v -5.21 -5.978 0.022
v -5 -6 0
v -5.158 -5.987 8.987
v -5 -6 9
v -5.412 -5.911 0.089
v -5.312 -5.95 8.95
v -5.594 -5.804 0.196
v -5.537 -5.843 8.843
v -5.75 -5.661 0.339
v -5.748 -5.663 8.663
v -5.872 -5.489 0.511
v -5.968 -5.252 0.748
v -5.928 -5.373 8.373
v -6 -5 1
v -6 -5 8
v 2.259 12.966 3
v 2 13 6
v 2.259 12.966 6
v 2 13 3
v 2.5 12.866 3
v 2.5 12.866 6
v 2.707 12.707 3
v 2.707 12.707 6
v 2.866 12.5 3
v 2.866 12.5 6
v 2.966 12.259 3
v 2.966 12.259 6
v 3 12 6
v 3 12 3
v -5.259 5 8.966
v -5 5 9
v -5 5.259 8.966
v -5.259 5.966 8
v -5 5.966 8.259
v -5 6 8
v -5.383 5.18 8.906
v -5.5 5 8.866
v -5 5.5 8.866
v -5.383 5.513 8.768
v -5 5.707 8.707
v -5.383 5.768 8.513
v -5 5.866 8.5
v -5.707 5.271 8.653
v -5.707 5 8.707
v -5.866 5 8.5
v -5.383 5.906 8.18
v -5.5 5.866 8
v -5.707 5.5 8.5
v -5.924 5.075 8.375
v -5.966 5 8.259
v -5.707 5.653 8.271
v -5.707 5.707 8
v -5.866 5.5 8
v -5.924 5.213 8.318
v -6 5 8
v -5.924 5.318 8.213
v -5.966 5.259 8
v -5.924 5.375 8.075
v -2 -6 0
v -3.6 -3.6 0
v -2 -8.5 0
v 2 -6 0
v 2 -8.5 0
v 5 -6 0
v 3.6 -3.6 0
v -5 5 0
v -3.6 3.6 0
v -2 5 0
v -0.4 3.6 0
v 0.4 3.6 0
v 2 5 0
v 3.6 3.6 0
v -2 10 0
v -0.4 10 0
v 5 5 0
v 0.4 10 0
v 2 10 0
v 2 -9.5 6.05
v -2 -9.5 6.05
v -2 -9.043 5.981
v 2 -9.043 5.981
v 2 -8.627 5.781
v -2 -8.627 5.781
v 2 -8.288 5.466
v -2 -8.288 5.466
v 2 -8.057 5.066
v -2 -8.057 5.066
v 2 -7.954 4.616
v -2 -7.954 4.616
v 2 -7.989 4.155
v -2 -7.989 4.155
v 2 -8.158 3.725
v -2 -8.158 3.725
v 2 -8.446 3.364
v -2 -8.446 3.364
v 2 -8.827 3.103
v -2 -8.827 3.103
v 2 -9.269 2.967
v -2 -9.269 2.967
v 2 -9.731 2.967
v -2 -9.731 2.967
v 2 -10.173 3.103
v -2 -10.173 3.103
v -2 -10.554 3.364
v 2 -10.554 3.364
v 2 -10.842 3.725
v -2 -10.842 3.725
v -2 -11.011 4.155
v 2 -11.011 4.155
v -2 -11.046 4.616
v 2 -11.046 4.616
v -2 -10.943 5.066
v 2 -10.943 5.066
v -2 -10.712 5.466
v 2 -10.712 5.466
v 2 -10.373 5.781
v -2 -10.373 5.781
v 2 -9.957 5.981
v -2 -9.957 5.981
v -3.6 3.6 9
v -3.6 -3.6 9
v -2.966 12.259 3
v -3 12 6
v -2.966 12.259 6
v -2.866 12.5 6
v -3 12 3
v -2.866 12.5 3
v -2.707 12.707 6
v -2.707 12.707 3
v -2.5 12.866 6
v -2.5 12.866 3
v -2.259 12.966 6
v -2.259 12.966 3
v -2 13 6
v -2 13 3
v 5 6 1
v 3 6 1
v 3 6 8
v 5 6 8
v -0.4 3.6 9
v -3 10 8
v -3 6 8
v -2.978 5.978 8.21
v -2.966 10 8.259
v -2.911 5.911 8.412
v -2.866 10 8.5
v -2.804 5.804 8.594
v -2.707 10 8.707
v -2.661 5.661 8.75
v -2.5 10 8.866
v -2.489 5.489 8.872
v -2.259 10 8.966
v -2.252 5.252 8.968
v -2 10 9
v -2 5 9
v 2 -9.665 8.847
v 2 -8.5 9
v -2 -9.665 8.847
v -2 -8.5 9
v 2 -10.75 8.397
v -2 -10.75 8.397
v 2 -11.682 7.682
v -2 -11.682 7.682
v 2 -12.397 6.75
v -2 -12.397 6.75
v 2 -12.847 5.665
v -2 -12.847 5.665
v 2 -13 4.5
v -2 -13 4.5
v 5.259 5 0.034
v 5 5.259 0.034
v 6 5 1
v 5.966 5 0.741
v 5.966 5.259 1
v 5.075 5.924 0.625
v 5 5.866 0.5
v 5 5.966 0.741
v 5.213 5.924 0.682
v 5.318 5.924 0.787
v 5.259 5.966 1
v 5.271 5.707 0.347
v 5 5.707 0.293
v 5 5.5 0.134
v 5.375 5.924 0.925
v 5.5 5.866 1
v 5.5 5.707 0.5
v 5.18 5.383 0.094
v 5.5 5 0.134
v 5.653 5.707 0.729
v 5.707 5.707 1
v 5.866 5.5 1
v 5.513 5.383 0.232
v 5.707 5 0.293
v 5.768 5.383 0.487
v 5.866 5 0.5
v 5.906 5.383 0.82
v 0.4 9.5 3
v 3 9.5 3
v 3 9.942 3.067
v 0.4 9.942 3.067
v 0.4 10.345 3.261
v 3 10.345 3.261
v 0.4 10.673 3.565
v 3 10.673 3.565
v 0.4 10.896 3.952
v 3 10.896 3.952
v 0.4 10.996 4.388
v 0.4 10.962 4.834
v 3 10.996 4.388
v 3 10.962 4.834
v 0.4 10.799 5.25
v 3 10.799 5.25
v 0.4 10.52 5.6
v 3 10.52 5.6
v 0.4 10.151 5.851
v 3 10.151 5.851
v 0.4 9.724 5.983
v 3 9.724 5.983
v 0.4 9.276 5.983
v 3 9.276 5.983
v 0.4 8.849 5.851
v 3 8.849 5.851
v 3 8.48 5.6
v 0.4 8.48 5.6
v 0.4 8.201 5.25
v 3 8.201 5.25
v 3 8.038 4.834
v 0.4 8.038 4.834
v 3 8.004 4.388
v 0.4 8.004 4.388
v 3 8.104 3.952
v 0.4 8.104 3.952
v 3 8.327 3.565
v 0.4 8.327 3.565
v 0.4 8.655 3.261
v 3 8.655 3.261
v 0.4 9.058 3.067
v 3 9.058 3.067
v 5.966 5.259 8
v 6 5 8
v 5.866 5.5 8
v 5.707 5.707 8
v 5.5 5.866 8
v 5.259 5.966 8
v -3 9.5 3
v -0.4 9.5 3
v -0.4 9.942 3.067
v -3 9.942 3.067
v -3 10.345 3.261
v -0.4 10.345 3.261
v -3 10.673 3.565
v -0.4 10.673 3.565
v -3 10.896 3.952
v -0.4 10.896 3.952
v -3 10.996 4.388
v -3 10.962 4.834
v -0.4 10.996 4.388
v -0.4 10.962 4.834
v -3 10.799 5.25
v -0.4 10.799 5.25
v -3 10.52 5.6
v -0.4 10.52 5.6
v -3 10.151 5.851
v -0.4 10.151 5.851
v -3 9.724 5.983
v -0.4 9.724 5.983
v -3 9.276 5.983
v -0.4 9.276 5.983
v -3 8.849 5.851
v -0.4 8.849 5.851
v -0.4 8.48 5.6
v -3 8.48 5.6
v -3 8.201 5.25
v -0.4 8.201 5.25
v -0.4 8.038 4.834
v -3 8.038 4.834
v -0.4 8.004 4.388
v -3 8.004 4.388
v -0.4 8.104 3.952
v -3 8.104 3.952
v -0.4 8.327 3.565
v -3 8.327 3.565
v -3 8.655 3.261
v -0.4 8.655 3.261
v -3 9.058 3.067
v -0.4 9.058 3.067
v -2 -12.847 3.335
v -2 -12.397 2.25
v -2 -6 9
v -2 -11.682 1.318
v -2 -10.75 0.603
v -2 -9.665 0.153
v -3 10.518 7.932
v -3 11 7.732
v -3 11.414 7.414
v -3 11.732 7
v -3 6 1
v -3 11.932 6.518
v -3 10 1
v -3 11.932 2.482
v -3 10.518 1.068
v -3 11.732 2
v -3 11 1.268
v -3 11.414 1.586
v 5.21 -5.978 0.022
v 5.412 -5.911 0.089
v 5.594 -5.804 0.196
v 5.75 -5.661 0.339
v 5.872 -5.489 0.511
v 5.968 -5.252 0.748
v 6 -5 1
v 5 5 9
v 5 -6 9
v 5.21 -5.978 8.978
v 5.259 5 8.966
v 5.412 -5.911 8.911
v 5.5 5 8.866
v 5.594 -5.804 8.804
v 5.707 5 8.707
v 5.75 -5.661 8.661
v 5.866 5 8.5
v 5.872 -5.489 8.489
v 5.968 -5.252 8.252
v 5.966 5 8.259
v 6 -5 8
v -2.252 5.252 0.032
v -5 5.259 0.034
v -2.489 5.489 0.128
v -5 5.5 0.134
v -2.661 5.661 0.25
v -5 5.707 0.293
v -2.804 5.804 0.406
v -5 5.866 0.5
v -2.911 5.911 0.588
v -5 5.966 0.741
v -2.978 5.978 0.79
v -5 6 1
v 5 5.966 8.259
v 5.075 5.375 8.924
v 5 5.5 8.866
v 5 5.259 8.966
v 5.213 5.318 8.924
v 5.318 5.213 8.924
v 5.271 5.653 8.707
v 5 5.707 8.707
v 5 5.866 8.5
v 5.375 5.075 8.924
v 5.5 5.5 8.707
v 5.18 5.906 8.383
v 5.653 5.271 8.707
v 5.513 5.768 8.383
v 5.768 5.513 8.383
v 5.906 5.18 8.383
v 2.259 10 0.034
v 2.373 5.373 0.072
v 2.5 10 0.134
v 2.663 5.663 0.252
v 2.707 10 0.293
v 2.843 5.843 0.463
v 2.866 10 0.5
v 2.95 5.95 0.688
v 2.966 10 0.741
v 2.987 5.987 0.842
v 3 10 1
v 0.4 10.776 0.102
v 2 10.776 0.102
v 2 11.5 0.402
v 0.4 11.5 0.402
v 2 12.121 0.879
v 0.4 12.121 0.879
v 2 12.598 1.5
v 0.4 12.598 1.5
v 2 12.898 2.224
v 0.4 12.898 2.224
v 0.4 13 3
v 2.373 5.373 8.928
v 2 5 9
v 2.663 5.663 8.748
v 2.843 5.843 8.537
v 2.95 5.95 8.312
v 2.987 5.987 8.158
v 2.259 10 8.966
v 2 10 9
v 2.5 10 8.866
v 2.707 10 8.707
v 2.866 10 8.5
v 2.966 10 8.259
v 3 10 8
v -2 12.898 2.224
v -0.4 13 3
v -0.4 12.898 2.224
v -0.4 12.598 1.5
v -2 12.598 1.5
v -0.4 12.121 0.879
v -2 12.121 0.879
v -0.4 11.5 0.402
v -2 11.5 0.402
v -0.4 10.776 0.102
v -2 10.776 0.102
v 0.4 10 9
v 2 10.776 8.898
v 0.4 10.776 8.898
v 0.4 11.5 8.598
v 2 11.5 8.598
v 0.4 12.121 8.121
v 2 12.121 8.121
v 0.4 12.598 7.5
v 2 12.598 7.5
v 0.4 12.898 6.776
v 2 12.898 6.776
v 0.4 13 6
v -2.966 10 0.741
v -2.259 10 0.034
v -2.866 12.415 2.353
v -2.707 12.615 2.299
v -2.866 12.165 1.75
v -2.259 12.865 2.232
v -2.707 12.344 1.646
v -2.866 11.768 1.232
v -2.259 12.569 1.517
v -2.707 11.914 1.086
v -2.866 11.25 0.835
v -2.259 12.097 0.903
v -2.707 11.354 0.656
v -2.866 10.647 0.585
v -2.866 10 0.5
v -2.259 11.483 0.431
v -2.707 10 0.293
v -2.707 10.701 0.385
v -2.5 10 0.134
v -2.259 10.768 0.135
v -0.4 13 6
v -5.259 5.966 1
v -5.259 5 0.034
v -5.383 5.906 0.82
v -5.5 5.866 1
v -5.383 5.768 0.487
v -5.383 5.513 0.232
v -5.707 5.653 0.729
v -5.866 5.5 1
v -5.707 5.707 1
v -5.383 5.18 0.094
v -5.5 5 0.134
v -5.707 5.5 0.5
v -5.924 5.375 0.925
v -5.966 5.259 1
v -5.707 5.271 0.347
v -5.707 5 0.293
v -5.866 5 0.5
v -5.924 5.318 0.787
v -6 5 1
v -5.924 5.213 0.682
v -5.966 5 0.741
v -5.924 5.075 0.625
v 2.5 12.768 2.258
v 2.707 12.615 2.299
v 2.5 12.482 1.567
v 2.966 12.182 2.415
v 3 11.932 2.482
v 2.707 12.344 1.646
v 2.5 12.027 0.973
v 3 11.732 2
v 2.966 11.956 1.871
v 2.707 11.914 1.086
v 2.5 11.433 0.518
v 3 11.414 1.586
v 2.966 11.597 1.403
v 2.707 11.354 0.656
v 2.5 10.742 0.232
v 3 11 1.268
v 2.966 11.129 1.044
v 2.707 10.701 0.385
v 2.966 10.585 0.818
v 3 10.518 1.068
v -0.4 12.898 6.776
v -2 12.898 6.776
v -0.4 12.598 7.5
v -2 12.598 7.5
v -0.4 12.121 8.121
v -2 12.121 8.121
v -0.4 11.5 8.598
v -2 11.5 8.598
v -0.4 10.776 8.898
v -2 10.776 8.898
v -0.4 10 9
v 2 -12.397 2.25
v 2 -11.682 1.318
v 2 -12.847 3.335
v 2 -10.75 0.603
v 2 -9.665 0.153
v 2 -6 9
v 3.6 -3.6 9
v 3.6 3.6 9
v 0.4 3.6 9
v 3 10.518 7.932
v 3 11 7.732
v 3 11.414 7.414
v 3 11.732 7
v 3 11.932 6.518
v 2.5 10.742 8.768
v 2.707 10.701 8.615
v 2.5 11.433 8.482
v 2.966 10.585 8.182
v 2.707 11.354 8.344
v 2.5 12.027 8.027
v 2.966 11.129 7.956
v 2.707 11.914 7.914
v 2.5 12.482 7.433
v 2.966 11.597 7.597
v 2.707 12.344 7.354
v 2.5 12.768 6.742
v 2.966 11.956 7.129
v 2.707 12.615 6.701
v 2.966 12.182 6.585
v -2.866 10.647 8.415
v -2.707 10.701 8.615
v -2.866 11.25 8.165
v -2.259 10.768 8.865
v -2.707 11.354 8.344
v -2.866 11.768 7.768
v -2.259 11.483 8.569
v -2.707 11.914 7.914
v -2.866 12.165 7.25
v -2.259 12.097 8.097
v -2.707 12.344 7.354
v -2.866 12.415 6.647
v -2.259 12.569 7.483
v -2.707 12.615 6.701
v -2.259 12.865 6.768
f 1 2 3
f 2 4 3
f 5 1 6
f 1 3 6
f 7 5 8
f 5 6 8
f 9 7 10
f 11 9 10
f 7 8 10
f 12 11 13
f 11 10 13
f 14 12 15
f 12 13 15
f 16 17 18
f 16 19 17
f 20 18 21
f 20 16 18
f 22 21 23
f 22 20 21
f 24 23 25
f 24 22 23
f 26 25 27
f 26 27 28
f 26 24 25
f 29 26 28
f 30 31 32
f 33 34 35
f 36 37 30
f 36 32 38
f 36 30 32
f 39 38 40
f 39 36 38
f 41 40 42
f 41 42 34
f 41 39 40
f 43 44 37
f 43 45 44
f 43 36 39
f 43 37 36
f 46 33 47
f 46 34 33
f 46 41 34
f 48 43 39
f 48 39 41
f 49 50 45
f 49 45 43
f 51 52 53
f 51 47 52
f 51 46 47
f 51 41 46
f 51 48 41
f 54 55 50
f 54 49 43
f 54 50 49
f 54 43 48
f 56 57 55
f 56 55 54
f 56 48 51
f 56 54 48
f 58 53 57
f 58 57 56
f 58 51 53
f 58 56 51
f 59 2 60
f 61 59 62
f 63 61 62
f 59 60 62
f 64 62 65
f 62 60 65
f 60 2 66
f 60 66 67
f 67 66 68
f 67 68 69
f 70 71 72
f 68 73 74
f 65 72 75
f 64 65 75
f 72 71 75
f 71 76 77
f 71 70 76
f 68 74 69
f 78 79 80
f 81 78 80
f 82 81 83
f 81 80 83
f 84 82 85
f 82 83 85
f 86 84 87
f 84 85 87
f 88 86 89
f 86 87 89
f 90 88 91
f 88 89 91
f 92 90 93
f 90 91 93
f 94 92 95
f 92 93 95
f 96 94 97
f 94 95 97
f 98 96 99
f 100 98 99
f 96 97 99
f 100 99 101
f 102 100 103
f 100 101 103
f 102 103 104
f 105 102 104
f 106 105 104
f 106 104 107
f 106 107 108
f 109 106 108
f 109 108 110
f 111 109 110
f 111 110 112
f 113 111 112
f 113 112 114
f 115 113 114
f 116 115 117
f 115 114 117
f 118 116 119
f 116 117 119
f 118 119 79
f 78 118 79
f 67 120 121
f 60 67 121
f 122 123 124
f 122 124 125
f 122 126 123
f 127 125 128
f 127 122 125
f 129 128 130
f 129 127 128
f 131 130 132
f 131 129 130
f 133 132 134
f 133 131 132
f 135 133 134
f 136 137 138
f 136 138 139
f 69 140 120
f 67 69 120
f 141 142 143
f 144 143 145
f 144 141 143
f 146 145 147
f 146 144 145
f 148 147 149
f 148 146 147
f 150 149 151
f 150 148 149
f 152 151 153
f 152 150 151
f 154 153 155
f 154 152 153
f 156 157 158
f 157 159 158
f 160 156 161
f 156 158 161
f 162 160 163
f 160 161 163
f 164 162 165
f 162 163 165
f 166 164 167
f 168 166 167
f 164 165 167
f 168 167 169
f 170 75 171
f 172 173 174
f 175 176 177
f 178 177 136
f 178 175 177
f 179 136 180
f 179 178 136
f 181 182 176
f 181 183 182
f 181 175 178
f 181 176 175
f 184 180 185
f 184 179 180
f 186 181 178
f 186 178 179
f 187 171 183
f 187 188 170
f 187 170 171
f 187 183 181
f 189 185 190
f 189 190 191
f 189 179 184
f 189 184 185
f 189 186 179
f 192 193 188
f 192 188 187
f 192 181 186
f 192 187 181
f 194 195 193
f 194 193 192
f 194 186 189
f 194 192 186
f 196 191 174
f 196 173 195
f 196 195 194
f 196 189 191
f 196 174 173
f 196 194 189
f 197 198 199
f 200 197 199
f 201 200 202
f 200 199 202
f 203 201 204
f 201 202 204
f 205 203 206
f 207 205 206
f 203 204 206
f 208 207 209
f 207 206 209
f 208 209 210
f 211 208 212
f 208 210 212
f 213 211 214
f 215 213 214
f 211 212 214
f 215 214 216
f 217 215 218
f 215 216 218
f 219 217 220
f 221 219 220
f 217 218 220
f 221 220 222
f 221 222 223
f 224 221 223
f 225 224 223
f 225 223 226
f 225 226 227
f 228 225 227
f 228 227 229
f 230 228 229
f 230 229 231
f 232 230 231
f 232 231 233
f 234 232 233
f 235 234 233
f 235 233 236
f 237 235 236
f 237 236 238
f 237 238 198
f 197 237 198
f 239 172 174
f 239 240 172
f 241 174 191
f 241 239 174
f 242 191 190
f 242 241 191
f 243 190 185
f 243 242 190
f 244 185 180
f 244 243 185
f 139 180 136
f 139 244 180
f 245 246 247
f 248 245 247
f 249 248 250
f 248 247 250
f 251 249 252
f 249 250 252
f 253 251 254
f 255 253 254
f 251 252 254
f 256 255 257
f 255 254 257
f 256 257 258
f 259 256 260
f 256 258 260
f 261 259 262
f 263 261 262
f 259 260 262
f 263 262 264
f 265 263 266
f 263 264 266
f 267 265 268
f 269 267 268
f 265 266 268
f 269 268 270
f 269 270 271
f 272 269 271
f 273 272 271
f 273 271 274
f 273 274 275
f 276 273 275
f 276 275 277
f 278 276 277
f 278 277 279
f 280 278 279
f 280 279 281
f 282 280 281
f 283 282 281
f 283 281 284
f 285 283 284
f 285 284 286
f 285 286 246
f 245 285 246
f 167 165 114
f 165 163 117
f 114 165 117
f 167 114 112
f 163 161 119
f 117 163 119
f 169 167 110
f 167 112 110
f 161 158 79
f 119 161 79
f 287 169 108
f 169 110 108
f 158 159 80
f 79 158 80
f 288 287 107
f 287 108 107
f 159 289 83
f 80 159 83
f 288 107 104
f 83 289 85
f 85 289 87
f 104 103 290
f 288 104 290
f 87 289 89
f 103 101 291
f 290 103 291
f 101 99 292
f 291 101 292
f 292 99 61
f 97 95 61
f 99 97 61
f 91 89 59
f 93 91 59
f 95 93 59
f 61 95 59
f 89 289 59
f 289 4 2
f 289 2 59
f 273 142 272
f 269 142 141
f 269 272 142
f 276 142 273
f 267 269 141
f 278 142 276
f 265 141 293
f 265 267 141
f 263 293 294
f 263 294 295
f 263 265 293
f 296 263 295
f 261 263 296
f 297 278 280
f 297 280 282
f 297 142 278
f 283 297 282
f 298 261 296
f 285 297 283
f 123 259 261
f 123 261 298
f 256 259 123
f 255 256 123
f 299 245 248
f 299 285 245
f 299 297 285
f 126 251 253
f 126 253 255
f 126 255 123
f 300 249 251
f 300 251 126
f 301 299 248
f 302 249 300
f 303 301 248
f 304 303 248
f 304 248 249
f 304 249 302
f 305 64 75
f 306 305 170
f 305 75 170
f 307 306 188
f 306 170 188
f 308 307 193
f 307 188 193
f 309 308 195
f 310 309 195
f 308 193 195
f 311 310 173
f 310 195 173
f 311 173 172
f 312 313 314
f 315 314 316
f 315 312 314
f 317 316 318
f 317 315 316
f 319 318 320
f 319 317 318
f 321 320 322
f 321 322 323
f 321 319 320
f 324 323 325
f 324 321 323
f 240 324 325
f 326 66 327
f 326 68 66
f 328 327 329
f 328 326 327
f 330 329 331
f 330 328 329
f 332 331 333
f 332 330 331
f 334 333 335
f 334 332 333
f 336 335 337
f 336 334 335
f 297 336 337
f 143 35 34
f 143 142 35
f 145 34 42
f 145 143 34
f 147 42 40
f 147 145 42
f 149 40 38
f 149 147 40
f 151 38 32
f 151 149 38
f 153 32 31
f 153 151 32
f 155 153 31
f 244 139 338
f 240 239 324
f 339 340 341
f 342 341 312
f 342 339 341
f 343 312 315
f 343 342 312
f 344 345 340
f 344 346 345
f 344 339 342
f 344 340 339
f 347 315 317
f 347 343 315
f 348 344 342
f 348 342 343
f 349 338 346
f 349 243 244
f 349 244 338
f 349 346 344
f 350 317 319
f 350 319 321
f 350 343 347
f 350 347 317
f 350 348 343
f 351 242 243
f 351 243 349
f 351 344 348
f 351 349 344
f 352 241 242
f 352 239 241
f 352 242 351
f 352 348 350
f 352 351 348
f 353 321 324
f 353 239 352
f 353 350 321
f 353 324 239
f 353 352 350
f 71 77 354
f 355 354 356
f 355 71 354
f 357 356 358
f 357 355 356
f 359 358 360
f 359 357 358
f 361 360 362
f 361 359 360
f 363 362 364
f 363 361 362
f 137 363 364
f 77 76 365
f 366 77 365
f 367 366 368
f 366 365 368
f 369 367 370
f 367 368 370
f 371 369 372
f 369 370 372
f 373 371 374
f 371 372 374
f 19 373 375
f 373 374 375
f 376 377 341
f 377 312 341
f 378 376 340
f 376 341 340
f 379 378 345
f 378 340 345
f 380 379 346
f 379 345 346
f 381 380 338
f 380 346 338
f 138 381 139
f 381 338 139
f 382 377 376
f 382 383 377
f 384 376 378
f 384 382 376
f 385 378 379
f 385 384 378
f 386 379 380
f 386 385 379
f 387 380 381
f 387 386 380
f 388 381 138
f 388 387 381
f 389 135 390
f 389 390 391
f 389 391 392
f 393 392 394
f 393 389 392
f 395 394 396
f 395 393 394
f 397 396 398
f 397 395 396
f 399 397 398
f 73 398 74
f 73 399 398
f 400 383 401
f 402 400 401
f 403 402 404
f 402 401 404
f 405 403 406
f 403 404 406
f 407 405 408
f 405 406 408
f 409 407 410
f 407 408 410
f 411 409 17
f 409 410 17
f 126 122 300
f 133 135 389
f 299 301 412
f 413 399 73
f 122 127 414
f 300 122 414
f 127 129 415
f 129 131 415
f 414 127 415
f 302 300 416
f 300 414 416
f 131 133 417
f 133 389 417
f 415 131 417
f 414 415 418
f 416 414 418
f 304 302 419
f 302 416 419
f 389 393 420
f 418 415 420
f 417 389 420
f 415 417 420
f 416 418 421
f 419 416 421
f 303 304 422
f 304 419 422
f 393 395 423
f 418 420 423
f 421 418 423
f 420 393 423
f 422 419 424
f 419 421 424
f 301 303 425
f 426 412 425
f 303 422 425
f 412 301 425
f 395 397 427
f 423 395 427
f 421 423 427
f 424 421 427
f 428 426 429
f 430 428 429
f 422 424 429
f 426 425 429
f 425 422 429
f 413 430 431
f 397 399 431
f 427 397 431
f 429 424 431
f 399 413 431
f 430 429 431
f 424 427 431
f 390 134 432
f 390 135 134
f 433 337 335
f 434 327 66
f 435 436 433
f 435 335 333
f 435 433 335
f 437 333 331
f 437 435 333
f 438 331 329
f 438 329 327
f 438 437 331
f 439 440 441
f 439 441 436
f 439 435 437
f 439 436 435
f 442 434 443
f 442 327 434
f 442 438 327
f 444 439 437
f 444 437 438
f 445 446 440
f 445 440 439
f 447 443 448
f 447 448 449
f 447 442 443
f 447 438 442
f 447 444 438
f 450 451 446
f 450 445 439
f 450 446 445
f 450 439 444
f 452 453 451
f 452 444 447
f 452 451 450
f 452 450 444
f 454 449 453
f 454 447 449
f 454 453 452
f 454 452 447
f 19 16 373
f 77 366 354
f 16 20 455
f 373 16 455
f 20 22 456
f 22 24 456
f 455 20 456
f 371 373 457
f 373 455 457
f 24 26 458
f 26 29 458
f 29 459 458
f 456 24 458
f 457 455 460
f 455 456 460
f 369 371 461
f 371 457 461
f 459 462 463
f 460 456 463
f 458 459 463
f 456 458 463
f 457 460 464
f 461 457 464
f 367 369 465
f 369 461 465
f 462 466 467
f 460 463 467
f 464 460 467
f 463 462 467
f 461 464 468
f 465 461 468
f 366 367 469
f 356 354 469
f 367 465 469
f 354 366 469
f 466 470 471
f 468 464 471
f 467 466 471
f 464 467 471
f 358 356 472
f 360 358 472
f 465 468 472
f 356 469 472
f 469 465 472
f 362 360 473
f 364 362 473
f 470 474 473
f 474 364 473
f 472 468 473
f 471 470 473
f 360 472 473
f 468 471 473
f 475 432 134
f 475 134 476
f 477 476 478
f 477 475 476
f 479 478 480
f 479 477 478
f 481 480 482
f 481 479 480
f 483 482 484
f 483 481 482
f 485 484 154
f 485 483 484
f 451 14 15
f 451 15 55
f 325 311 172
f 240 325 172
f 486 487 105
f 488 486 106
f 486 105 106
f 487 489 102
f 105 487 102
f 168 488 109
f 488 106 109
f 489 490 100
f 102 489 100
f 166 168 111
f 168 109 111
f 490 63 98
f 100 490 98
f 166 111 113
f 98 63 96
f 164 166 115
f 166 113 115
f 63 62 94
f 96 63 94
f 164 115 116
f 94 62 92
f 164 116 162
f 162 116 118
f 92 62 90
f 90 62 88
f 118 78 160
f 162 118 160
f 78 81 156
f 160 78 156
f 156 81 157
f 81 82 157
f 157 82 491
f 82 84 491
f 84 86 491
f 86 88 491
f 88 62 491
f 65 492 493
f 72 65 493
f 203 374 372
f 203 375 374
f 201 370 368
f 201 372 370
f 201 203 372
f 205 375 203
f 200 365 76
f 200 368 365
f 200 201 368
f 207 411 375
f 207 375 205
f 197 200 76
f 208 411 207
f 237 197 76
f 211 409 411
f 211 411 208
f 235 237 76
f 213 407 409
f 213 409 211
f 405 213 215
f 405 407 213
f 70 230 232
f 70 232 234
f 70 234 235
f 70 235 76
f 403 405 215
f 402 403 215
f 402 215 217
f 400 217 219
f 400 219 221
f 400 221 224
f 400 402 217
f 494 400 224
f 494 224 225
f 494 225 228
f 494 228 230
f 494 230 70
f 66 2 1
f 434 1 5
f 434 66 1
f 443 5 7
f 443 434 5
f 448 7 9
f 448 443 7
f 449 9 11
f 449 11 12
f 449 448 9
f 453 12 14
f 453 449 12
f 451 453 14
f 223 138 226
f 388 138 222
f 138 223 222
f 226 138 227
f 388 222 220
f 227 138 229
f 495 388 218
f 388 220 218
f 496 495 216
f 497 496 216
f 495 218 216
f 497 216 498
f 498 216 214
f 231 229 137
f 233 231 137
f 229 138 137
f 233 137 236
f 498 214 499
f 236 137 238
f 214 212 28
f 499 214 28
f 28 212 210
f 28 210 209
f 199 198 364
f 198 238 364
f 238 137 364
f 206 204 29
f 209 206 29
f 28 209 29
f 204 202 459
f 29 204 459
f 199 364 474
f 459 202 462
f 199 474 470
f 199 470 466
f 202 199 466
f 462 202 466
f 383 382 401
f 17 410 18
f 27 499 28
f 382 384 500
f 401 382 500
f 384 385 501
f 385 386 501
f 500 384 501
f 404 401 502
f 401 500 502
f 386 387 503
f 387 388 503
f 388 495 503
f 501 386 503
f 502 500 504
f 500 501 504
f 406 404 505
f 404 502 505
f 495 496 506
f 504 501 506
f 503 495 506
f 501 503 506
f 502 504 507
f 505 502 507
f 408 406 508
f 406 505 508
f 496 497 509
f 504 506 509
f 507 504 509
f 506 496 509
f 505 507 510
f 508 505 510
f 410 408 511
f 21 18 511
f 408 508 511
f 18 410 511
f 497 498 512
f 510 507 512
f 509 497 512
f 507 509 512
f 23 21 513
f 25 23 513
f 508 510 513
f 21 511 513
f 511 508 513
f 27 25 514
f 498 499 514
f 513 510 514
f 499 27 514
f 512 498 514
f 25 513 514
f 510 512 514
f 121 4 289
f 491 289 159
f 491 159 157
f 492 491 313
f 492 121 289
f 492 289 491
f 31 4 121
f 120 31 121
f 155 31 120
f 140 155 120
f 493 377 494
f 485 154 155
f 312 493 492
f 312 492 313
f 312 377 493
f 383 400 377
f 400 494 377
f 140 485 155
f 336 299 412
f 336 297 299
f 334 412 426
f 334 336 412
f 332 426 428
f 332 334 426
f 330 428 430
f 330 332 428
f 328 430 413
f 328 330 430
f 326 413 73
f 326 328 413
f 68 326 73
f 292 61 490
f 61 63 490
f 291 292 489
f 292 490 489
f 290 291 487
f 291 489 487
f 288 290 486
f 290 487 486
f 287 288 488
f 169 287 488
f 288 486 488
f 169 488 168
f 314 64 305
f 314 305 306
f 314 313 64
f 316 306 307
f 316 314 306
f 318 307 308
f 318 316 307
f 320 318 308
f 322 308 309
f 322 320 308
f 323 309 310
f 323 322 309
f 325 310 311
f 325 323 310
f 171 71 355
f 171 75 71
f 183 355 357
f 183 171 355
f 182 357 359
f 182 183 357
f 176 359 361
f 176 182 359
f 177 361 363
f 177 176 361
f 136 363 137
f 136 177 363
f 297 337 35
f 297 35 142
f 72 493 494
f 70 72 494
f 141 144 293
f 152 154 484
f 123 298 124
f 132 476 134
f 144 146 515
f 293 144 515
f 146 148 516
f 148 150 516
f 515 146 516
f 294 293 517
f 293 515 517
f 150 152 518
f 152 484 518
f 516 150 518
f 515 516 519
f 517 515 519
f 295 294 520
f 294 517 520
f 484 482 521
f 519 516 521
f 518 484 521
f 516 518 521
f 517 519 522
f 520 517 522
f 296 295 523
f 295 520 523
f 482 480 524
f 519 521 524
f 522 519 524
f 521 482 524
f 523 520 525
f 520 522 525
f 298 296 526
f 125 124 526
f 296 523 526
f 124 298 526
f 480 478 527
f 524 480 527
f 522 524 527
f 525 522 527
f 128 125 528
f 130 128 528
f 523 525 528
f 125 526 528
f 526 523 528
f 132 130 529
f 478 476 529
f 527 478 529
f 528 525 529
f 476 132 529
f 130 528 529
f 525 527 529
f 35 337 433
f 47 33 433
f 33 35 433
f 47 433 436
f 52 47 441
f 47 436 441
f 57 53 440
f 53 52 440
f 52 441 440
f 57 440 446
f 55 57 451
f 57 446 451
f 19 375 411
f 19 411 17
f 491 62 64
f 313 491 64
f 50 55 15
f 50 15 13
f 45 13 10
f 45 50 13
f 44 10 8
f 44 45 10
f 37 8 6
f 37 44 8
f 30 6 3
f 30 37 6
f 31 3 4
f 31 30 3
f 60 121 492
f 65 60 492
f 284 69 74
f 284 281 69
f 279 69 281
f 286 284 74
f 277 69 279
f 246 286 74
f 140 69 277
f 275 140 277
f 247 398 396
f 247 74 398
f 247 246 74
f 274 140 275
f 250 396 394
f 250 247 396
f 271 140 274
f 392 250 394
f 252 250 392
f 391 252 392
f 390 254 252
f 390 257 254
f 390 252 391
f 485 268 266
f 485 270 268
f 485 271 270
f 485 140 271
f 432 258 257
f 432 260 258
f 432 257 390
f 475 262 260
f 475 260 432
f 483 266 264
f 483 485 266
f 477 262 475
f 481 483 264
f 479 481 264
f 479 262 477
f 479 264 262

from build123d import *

# Parameters (mm, degrees)
SKETCH_1_W          = 3
SKETCH_1_H          = 7
SKETCH_1_W_2        = 12
SKETCH_1_H_2        = 12
SKETCH_1_W_3        = 7
SKETCH_1_W_4        = 5
EXTRUDE_1_DEPTH     = 9
CUT_EXTRUDE_1_DEPTH = 17.911534525
FILLET_2_R          = 3
SKETCH_4_R          = 1.5
CUT_EXTRUDE_3_DEPTH = 19.193405399
FILLET_3_R          = 1
FILLET_4_R          = 1
FILLET_5_R          = 1
SKETCH_5_W          = 5
SKETCH_5_H          = 7
CUT_EXTRUDE_4_DEPTH = 9
EXTRUDE_2_DEPTH     = 7
FILLET_6_R          = 4.5
SKETCH_7_R          = 1.55
CUT_EXTRUDE_5_DEPTH = 4
SKETCH_8_W          = 3.1
SKETCH_8_H          = 0.1
CUT_EXTRUDE_6_DEPTH = 17.911534525


# Some blends are built 0.0001 mm under size
with BuildPart() as part:
    # 草图1 → 凸台-拉伸1 (new body)
    # profile 1 of 4: a face of its own
    with BuildSketch(Plane.XY):
        with Locations((-1.5, 9.5)):
            Rectangle(SKETCH_1_W, SKETCH_1_H)
    # profile 2 of 4: a face of its own
    with BuildSketch(Plane.XY):
        with Locations((1.5, 9.5)):
            Rectangle(SKETCH_1_W, SKETCH_1_H)
    # profile 3 of 4: a face of its own
    with BuildSketch(Plane.XY):
        Rectangle(SKETCH_1_W_2, SKETCH_1_H_2)
        Rectangle(SKETCH_1_W_3, SKETCH_1_H, mode=Mode.SUBTRACT)
    # profile 4 of 4: a face of its own
    with BuildSketch(Plane.XY):
        with Locations((1, -9.5)):
            Rectangle(SKETCH_1_W_4, SKETCH_1_H)
    extrude(amount=EXTRUDE_1_DEPTH)

    # 草图2 → 切除-拉伸1 (cut, through all)
    with BuildSketch(Plane.XY.offset(9)):
        Polygon((0, 13), (0.4, 13), (0.4, 3.5), (0, 3.5), (-0.4, 3.5), (-0.4, 13), align=None)
    extrude(amount=-CUT_EXTRUDE_1_DEPTH, mode=Mode.SUBTRACT)

    # 圆角2
    fillet_2_edges = [part.edges().sort_by_distance(p)[0] for p in [
        (1.7, 13, 9),
        (1.7, 13, 0),
        (-1.7, 13, 0),
        (-1.7, 13, 9),
    ]]
    fillet(fillet_2_edges, radius=FILLET_2_R)

    # 草图4 → 切除-拉伸3 (cut, through all)
    with BuildSketch(Plane(origin=(3, 0, 0), x_dir=(0, 0, -1), z_dir=(1, 0, 0))):
        with Locations((-4.5, 9.5)):
            Circle(SKETCH_4_R)
    extrude(amount=-CUT_EXTRUDE_3_DEPTH, mode=Mode.SUBTRACT)

    # 圆角3
    fillet_3_edges = [part.edges().sort_by_distance(p)[0] for p in [
        (3, 8, 9),
        (6, 0, 0),
        (3, 8, 0),
        (4.5, 6, 0),
        (6, 6, 4.5),
        (6, -6, 4.5),
        (4.5, 6, 9),
        (6, 0, 9),
        (3, 13, 4.5),
        (3, 12.121320344, 8.121320344),
        (3, 12.121320344, 0.878679656),
    ]]
    fillet(fillet_3_edges, radius=FILLET_3_R)

    # 圆角4
    fillet_4_edges = [part.edges().sort_by_distance(p)[0] for p in [
        (-3, 8, 9),
        (-6, 0, 0),
        (-4.5, 6, 0),
        (-3, 8, 0),
        (-4.5, 6, 9),
        (-6, 0, 9),
        (-6, -6, 4.5),
        (-3, 13, 4.5),
        (-3, 12.121320344, 8.121320344),
        (-3, 12.121320344, 0.878679656),
    ]]
    fillet(fillet_4_edges, radius=FILLET_4_R)

    # 圆角5
    # the kernel refuses this fillet: 1 mm, written as the material it takes off along each edge
    with BuildSketch(Plane(origin=(-5, 5, 8), x_dir=(0, 1, 0), z_dir=(-1, 0, 0))) as fillet_5_piece_1_section:
        Polygon((0, 0), (FILLET_5_R, 0), (FILLET_5_R, -FILLET_5_R), (0, -FILLET_5_R), align=None)
    fillet_5_piece_1 = extrude(amount=FILLET_5_R, mode=Mode.PRIVATE)
    fillet_5_piece_1 = fillet_5_piece_1 - Plane(origin=(-5, 5, 8), x_dir=(0, -0.7071067811865475, -0.7071067811865475), z_dir=(-1, 0, 0)) * Sphere(FILLET_5_R, mode=Mode.PRIVATE)
    add(fillet_5_piece_1, mode=Mode.SUBTRACT)
    with BuildSketch(Plane(origin=(-5, 5, 1), x_dir=(0, 1, 0), z_dir=(-1, 0, 0))) as fillet_5_piece_2_section:
        Polygon((0, 0), (FILLET_5_R, 0), (FILLET_5_R, FILLET_5_R), (0, FILLET_5_R), align=None)
    fillet_5_piece_2 = extrude(amount=FILLET_5_R, mode=Mode.PRIVATE)
    fillet_5_piece_2 = fillet_5_piece_2 - Plane(origin=(-5, 5, 1), x_dir=(0, -0.7071067811865475, 0.7071067811865475), z_dir=(-1, 0, 0)) * Sphere(FILLET_5_R, mode=Mode.PRIVATE)
    add(fillet_5_piece_2, mode=Mode.SUBTRACT)
    with BuildSketch(Plane(origin=(-6, 6, 1), x_dir=(0, -1, 0), z_dir=(0, 0, 1))) as fillet_5_piece_3:
        with BuildLine():
            CenterArc((FILLET_5_R, FILLET_5_R), FILLET_5_R, 180, 90)
            Line((0, FILLET_5_R), (0, 0))
            Line((0, 0), (FILLET_5_R, 0))
        make_face()
    extrude(amount=7, mode=Mode.SUBTRACT)

    # 草图5 → 切除-拉伸4 (cut)
    with BuildSketch(Plane.XY.offset(9)):
        with Locations((1, -9.5)):
            Rectangle(SKETCH_5_W, SKETCH_5_H)
    extrude(amount=-CUT_EXTRUDE_4_DEPTH, mode=Mode.SUBTRACT)

    # 草图6 → 凸台-拉伸2 (add)
    with BuildSketch(Plane.XZ.offset(6)):
        Polygon((0, 9), (-2, 9), (-2, 0), (0, 0), (2, 0), (2, 9), align=None)
    extrude(amount=EXTRUDE_2_DEPTH)

    # 圆角6
    fillet_6_edges = [part.edges().sort_by_distance(p)[0] for p in [
        (0, -13, 0),
        (0, -13, 9),
    ]]
    fillet(fillet_6_edges, radius=FILLET_6_R - 0.0001)  # a hair under: the kernel refuses the full size

    # 草图7 → 切除-拉伸5 (cut)
    with BuildSketch(Plane.ZY.offset(2)):
        with Locations((4.5, -9.5)):
            Circle(SKETCH_7_R)
    extrude(amount=-CUT_EXTRUDE_5_DEPTH, mode=Mode.SUBTRACT)

    # 草图8 → 切除-拉伸6 (cut, through all)
    with BuildSketch(Plane.XY.offset(9)):
        with Locations((-1.95, 3.55)):
            Rectangle(SKETCH_8_W, SKETCH_8_H)
        Polygon((0.4, 3.5), (3.5, 3.5), (3.6, 3.5), (3.6, 3.6), (0.4, 3.6), align=None)
        Polygon((3.6, 3.5), (3.5, 3.5), (3.5, -3.5), (3.5, -3.6), (3.6, -3.6), align=None)
        Polygon((-3.6, -3.5), (-3.5, -3.5), (-3.5, 3.5), (-3.5, 3.6), (-3.6, 3.6), align=None)
        Polygon((3.5, -3.6), (3.5, -3.5), (-3.5, -3.5), (-3.6, -3.5), (-3.6, -3.6), align=None)
    extrude(amount=-CUT_EXTRUDE_6_DEPTH, mode=Mode.SUBTRACT)


solid = part.part
